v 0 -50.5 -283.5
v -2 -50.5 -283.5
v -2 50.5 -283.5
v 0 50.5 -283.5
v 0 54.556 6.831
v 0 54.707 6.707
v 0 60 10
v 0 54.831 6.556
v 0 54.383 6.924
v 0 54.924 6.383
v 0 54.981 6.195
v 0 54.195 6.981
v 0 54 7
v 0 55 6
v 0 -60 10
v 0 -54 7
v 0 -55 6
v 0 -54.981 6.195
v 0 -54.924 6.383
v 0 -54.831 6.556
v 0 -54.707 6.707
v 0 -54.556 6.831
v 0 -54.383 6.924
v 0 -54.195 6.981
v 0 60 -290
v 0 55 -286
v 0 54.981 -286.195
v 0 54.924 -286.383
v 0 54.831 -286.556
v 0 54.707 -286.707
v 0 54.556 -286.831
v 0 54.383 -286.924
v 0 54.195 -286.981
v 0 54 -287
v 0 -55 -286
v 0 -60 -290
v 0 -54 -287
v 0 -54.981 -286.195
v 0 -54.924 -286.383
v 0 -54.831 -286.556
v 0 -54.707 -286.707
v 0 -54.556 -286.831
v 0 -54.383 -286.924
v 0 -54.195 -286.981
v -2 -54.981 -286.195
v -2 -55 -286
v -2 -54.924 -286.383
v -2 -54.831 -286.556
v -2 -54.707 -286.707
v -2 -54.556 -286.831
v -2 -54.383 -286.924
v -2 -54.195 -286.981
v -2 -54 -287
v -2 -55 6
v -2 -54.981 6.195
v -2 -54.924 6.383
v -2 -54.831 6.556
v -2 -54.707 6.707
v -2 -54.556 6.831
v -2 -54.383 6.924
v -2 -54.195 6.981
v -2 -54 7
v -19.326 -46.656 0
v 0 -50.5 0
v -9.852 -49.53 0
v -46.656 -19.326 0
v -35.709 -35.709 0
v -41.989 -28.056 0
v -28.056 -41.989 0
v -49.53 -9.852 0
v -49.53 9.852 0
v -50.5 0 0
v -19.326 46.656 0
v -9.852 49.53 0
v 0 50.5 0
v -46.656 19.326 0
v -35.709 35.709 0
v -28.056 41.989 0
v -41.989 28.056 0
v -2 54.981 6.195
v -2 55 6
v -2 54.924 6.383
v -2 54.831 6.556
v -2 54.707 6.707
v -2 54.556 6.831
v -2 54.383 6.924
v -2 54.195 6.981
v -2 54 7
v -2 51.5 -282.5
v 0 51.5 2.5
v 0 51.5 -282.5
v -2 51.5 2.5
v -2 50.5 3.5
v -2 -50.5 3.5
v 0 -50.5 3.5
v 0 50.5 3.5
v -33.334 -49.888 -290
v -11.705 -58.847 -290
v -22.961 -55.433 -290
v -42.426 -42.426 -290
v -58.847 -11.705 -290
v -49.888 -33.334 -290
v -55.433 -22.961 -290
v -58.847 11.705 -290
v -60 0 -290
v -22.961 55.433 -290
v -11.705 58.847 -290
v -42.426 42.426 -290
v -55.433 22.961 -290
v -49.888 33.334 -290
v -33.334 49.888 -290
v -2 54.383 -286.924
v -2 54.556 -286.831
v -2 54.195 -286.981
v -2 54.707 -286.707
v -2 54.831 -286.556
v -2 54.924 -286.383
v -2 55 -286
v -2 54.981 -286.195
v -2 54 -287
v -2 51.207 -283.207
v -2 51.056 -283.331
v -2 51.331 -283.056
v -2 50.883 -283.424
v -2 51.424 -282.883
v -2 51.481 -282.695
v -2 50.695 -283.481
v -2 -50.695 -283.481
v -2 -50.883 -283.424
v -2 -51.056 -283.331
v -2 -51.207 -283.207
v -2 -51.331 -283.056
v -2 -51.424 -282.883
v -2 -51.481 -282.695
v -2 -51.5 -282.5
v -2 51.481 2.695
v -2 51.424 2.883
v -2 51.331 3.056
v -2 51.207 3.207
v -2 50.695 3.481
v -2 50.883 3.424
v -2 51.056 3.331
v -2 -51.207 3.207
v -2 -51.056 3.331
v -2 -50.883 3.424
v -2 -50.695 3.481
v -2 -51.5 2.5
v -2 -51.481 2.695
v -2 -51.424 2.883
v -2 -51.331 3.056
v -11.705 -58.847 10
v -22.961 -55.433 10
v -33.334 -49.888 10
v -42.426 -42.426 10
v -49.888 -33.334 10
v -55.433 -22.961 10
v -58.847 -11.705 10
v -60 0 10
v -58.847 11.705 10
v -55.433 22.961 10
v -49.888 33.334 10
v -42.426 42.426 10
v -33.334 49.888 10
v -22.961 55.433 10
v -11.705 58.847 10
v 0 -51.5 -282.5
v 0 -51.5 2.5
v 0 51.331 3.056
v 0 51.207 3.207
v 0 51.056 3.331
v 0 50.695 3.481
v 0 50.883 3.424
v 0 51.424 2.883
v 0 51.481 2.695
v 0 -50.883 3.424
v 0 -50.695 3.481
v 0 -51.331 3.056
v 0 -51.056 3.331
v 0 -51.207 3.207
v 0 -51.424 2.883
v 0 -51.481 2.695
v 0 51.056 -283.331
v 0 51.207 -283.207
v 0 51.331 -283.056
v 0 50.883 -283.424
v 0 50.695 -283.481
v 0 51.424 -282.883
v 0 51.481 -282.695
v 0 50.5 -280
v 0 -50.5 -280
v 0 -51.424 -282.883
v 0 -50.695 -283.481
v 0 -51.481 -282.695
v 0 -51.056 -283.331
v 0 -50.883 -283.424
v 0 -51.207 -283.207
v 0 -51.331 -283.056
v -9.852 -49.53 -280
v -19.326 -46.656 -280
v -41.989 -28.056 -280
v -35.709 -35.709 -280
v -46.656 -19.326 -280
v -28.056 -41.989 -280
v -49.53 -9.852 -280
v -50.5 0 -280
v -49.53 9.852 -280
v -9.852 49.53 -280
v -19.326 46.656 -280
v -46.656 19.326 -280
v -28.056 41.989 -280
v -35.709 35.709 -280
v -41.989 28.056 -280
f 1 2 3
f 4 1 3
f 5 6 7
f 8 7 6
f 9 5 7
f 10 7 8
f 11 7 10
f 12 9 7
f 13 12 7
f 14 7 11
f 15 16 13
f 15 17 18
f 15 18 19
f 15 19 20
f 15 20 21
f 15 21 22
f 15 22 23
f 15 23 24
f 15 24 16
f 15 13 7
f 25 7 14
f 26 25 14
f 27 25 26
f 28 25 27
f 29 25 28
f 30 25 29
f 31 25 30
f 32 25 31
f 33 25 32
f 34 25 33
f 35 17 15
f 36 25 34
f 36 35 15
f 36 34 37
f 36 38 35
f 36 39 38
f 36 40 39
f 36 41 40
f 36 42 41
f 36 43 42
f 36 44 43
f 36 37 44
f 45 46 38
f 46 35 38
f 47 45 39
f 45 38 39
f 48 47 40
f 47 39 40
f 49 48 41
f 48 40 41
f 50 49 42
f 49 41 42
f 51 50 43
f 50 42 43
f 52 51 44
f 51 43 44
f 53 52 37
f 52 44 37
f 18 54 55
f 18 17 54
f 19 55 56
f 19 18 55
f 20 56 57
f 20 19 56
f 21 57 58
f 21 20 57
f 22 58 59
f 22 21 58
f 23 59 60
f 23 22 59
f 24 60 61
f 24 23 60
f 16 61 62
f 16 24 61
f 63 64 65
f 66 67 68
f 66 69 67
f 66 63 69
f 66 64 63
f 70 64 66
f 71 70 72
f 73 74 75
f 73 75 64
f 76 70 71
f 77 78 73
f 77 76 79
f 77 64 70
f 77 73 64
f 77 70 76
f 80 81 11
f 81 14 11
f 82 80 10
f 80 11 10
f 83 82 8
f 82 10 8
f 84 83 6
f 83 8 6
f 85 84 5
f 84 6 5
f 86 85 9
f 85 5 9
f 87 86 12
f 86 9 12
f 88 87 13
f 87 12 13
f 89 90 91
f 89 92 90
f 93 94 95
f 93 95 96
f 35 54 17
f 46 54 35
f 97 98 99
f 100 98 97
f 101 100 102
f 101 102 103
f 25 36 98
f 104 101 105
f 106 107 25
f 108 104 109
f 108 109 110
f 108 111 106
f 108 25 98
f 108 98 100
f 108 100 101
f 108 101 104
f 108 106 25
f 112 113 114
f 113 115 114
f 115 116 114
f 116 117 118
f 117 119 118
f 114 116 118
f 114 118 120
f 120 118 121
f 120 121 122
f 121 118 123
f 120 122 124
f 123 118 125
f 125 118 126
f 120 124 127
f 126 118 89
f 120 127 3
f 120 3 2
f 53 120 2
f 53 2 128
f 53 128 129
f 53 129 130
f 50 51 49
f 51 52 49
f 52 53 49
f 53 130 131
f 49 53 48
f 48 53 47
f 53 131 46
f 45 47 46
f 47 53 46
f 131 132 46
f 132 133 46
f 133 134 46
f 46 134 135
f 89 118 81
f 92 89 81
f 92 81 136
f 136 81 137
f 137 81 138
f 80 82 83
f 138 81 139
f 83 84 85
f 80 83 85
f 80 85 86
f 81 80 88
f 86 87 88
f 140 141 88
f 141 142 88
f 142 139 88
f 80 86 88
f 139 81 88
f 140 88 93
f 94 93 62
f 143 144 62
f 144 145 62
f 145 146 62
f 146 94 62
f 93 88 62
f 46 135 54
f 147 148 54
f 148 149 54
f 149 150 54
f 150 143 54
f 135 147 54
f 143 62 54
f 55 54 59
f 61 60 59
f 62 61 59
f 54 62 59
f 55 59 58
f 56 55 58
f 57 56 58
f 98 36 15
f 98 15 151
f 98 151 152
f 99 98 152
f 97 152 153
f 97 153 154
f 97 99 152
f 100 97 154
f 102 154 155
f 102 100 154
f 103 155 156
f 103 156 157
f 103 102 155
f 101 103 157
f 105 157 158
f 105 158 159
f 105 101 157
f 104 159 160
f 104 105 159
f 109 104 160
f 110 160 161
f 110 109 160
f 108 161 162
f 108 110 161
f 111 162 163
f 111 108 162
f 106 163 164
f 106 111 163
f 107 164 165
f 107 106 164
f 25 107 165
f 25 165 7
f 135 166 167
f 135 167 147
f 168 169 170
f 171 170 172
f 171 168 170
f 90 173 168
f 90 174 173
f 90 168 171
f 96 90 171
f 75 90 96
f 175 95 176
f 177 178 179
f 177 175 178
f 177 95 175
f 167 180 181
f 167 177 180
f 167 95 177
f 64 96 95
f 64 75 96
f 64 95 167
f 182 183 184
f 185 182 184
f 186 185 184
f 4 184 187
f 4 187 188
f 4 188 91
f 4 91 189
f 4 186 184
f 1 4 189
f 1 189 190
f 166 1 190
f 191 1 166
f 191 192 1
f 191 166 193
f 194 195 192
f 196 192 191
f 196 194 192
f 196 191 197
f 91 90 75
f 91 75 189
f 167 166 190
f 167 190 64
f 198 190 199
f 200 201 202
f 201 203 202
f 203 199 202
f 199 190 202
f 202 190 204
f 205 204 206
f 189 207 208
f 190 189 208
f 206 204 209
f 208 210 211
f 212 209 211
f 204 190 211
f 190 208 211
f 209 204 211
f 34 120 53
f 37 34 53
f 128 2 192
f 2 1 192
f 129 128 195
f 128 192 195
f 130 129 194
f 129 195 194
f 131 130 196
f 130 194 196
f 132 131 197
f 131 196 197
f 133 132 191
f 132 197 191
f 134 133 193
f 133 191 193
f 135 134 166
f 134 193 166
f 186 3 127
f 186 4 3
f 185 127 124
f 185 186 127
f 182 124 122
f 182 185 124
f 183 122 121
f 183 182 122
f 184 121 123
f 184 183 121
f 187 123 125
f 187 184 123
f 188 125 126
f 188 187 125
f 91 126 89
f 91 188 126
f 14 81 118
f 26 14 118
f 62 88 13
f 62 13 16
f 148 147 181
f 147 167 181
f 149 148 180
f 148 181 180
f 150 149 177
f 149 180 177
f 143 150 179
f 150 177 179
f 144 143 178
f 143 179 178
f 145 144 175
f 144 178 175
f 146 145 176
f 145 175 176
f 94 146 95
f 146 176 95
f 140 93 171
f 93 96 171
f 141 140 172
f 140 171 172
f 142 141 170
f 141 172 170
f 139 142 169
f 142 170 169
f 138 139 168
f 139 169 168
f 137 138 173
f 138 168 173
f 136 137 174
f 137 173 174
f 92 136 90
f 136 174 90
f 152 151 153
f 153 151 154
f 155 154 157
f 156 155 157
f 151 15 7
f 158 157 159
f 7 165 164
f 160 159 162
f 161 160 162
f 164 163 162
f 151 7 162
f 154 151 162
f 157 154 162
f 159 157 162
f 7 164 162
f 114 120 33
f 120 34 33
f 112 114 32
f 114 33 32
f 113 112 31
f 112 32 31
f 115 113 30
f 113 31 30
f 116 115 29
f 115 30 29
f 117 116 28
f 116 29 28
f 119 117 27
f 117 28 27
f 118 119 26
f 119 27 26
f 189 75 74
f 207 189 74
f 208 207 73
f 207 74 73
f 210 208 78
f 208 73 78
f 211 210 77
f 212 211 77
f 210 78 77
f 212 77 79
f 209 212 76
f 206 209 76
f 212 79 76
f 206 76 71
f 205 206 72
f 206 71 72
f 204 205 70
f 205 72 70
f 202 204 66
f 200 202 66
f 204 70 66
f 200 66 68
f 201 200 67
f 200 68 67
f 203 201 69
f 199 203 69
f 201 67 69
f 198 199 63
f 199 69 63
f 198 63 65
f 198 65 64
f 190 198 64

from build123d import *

# Parameters (mm, degrees)
BOSS_EXTRUDE1_DEPTH     = 280
BOSS_EXTRUDE3_START     = 10
BOSS_EXTRUDE3_DEPTH     = 10
CUT_EXTRUDE_THIN1_START = -2
CUT_EXTRUDE_THIN1_DEPTH = 2
FILLET6_R               = 1


# Read off the part's stored shape, not the designer's step: Cut-Extrude-Thin1
with BuildPart() as part:
    # Sketch1 → Boss-Extrude1 (new body)
    with BuildSketch(Plane.XY):
        with BuildLine():
            Line((0, 55), (-2, 55))
            Line((-2, 55), (-2, 51.5))
            Line((-2, 51.5), (0, 51.5))
            Line((0, 51.5), (0, 50.5))
            ThreePointArc((0, 50.5), (-50.5, 0), (0, -50.5))
            Line((0, -50.5), (0, -51.5))
            Line((0, -51.5), (-2, -51.5))
            Line((-2, -51.5), (-2, -55))
            Line((-2, -55), (0, -55))
            Line((0, -55), (0, -60))
            ThreePointArc((0, -60), (-60, 0), (0, 60))
            Line((0, 60), (0, 55))
        make_face()
    extrude(amount=-BOSS_EXTRUDE1_DEPTH)

    # Sketch7 → Boss-Extrude3 (add)
    with BuildSketch(Plane.XY.offset(BOSS_EXTRUDE3_START)):
        with BuildLine():
            Line((0, 60), (0, -60))
            ThreePointArc((0, -60), (-60, 0), (0, 60))
        make_face()
    boss_extrude3 = extrude(amount=-BOSS_EXTRUDE3_DEPTH)

    # Mirror1: Boss-Extrude3 across plane
    add(boss_extrude3.mirror(Plane.XY.offset(-140)))

    # Cut-Extrude-Thin1 outline → Cut-Extrude-Thin1 (cut)
    with BuildSketch(Plane(origin=(0, 0, 0), x_dir=(0, 0, -1), z_dir=(1, 0, 0)).offset(CUT_EXTRUDE_THIN1_START)):
        Polygon((0, 55), (-7, 55), (-7, -55), (0, -55), (0, -51.5), (-3.5, -51.5), (-3.5, 51.5), (0, 51.5), align=None)
    cut_extrude_thin1 = extrude(amount=CUT_EXTRUDE_THIN1_DEPTH, mode=Mode.SUBTRACT)

    # Mirror2: Cut-Extrude-Thin1 across plane
    add(cut_extrude_thin1.mirror(Plane.XY.offset(-140)), mode=Mode.SUBTRACT)

    # Fillet6
    fillet6_edges = [part.edges().sort_by_distance(p)[0] for p in [
        (-1, -55, 7),
        (-1, 55, 7),
        (-1, 51.5, 3.5),
        (-1, -51.5, 3.5),
        (-1, -55, -287),
        (-1, -51.5, -283.5),
        (-1, 51.5, -283.5),
        (-1, 55, -287),
    ]]
    fillet(fillet6_edges, radius=FILLET6_R)


solid = part.part
